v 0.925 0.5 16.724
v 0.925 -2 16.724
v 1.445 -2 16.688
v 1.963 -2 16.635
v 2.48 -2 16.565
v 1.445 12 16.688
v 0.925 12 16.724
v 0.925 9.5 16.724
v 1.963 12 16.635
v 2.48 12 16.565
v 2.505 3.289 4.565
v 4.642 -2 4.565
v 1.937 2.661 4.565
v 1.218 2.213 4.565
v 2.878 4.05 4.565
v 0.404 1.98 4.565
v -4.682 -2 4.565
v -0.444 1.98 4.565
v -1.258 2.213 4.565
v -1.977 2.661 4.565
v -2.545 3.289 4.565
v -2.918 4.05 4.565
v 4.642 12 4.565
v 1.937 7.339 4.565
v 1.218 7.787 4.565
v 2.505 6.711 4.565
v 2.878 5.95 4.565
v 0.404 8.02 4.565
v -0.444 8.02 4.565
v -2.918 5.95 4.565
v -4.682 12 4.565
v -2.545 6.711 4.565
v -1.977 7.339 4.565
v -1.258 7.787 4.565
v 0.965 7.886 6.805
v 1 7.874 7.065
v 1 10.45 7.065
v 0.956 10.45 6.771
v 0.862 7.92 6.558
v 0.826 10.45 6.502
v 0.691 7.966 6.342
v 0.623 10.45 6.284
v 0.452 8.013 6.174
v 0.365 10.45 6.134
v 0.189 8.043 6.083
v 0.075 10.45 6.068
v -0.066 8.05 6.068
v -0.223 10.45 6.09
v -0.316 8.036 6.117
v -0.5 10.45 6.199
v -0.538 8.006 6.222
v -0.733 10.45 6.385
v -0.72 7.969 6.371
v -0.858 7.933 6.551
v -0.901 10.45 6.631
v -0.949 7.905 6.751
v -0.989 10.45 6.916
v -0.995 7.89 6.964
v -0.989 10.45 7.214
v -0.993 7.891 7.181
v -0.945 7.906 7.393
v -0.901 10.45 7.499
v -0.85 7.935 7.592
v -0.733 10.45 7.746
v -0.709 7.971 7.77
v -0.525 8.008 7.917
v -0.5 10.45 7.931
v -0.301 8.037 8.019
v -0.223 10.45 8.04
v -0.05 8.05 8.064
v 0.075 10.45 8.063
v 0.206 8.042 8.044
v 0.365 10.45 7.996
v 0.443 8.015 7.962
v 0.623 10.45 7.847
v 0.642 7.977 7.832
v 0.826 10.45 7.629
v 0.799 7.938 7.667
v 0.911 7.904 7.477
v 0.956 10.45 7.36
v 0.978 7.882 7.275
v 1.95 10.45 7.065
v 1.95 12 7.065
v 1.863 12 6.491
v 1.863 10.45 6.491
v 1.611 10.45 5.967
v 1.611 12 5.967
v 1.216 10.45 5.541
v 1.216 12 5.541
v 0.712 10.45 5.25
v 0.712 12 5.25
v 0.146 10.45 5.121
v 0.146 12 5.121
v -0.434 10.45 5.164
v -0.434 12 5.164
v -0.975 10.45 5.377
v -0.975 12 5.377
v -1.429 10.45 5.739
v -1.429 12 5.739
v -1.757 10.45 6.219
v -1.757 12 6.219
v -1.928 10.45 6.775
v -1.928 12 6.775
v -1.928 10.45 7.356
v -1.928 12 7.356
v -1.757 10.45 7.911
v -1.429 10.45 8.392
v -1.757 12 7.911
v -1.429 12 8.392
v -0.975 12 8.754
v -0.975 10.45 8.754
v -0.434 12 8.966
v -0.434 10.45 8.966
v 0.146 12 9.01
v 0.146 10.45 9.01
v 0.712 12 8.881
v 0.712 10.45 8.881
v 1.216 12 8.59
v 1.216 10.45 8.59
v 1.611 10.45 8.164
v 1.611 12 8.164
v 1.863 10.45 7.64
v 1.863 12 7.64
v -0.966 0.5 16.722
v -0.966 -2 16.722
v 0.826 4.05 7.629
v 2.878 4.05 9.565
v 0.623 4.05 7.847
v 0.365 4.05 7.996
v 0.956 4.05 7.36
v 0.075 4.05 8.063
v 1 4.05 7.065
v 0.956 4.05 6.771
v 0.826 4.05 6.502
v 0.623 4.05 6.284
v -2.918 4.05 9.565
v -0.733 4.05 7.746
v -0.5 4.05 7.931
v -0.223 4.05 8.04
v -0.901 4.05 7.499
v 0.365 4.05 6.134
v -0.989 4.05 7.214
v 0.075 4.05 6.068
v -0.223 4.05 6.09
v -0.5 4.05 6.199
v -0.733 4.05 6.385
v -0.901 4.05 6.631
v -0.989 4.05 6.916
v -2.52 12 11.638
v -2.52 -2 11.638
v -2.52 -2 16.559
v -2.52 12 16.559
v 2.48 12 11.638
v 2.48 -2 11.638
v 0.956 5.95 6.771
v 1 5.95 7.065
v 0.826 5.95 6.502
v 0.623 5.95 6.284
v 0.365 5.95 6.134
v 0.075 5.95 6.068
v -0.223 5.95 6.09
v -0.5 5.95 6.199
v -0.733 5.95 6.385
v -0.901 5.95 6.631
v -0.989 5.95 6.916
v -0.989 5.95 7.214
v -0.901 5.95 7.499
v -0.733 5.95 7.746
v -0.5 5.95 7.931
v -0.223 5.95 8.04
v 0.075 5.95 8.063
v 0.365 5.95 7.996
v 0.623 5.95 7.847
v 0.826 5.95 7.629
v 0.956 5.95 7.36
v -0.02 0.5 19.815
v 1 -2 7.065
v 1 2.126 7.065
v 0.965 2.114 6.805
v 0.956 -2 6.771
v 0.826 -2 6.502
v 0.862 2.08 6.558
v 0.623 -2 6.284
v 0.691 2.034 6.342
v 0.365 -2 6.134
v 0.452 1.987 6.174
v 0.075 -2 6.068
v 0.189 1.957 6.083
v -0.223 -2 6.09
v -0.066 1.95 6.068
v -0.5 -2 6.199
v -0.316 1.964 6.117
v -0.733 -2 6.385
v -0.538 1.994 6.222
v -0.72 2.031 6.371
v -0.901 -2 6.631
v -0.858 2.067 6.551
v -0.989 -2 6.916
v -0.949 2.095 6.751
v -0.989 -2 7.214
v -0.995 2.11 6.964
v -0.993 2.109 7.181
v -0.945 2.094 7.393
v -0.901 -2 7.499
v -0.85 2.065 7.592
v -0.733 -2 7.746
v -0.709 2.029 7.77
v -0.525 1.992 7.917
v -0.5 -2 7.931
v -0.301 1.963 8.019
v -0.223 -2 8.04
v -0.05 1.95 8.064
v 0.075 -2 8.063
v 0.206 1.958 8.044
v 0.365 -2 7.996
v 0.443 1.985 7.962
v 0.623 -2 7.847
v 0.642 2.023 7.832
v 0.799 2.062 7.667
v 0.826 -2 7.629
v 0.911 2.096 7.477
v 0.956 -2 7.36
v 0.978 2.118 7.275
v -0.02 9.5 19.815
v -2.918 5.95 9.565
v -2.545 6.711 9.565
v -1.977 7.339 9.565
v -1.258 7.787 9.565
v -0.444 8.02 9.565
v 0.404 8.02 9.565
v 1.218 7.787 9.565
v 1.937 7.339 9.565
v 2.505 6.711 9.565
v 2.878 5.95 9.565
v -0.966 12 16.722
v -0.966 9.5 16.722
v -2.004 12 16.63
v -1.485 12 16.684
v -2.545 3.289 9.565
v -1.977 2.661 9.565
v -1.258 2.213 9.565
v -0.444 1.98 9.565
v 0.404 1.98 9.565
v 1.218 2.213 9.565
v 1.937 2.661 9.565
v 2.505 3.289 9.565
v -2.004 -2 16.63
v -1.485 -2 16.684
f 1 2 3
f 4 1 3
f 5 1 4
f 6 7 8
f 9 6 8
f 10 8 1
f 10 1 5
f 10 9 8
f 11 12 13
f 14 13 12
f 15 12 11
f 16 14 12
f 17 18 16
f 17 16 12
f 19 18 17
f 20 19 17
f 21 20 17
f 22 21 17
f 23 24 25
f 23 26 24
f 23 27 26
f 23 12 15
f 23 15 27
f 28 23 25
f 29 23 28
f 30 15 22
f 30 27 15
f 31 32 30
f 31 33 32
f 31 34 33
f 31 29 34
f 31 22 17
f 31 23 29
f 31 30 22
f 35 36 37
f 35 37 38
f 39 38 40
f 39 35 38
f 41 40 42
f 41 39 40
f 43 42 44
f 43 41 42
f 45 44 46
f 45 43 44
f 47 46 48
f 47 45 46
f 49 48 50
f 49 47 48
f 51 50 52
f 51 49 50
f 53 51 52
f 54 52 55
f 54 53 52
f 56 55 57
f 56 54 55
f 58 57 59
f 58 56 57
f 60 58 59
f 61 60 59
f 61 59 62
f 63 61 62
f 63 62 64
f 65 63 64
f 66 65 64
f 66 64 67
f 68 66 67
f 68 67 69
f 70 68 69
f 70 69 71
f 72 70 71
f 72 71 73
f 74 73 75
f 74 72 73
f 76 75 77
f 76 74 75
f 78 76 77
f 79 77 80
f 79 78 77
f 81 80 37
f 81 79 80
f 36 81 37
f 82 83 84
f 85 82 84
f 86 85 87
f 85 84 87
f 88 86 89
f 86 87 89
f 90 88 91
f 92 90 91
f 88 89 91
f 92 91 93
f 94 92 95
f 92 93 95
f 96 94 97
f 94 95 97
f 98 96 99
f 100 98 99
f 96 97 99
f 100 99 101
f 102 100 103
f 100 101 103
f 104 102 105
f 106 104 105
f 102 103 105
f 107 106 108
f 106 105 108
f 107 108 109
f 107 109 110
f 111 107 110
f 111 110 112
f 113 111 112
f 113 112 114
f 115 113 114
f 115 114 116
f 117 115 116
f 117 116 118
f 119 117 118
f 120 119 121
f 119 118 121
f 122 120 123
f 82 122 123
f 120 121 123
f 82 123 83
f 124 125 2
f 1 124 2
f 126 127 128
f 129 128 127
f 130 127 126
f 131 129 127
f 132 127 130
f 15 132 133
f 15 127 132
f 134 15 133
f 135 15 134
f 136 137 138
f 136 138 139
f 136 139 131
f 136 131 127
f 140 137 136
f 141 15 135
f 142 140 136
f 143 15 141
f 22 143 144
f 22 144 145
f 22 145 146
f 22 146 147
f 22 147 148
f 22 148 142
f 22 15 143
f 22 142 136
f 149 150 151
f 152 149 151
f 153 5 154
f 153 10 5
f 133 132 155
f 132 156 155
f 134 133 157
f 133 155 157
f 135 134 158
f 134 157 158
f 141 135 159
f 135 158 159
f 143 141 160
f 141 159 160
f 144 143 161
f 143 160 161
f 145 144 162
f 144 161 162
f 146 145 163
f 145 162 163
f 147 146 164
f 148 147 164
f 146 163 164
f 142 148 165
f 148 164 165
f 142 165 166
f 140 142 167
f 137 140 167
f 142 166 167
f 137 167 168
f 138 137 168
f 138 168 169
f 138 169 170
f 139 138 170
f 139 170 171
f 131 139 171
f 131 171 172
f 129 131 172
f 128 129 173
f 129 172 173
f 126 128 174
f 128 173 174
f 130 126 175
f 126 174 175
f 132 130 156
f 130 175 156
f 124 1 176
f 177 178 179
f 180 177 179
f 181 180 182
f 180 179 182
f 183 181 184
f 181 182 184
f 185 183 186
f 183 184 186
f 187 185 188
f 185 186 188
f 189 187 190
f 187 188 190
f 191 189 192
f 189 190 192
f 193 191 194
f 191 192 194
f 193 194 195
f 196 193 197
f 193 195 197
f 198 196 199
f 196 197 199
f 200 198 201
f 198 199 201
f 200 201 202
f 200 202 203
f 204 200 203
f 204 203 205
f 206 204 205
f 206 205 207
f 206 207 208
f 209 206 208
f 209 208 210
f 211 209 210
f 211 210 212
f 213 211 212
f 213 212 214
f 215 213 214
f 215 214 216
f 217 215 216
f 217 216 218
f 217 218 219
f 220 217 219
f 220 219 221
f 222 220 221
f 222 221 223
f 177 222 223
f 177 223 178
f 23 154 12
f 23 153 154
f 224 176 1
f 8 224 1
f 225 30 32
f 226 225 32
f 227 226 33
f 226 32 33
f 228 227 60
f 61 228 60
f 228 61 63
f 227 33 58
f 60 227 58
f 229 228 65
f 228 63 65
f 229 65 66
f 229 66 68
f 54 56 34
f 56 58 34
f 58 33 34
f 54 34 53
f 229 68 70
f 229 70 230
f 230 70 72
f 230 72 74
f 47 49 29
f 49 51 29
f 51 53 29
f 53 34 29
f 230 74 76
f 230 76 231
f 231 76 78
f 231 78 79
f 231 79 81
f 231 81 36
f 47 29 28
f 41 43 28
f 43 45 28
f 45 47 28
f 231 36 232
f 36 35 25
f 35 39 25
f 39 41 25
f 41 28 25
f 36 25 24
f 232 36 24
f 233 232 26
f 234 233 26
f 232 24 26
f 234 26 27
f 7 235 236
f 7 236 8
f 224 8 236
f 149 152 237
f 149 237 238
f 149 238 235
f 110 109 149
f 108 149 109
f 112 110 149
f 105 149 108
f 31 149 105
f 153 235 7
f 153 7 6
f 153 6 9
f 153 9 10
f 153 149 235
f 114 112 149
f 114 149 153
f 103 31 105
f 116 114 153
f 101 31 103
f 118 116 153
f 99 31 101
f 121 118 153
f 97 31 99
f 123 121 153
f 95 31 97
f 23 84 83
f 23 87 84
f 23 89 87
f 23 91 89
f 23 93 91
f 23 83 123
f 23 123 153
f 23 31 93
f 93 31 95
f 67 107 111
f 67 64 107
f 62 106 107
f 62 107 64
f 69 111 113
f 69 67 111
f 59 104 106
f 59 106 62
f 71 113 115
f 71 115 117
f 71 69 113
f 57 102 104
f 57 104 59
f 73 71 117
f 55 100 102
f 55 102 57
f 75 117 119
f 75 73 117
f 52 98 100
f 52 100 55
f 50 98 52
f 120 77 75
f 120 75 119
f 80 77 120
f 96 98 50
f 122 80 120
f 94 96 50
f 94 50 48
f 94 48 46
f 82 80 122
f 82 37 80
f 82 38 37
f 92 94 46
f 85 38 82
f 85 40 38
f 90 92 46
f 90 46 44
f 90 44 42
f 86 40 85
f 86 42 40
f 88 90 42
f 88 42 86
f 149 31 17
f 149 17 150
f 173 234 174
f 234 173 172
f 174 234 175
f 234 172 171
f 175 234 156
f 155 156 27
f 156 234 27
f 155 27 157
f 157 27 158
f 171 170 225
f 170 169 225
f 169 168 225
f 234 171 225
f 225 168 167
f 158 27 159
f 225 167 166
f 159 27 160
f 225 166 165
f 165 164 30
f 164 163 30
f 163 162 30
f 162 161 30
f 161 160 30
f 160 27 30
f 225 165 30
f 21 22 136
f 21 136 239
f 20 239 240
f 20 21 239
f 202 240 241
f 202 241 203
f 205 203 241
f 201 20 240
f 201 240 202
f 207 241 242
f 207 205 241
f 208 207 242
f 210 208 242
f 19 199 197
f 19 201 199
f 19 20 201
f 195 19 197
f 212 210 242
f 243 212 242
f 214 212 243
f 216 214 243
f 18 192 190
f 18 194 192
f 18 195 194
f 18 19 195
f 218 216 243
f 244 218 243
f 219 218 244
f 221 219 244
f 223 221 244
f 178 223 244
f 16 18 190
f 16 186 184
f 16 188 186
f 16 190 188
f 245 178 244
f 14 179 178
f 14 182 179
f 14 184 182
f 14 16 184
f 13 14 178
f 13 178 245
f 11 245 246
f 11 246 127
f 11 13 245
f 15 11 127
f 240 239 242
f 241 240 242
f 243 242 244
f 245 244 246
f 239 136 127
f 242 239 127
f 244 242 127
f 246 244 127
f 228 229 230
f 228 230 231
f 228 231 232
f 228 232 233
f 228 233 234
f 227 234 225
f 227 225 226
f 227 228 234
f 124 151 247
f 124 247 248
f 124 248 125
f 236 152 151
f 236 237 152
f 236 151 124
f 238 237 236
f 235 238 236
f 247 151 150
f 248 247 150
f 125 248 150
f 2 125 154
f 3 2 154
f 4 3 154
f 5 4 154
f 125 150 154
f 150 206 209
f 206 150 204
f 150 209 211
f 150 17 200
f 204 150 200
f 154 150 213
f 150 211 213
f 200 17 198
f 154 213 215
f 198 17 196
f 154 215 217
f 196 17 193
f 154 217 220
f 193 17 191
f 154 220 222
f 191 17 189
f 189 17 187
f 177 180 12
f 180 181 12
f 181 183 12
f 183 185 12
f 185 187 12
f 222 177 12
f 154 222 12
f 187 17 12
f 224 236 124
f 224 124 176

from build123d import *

# Parameters (mm, degrees)
BOSS_EXTRUDE1_DEPTH      = 12
BOSS_EXTRUDE1_DEPTH_BACK = 2
CUT_EXTRUDE1_DEPTH       = 5
SKETCH5_R                = 1
CUT_EXTRUDE2_DEPTH       = 7.26
CUT_EXTRUDE2_DEPTH_BACK  = 8.74
SKETCH6_R                = 1.95
CUT_EXTRUDE3_DEPTH       = 1.55
CUT_EXTRUDE4_DEPTH       = 2.5


with BuildPart() as part:
    # Sketch1 → Boss-Extrude1 (new body, two sides)
    with BuildSketch(Plane(origin=(0, 0, 0), x_dir=(1, 0, 0), z_dir=(0, 1, 0))) as boss_extrude1_sk:
        with BuildLine():
            Line((4.642363604, -4.565370009), (-4.68242218, -4.565370009))
            Line((-4.68242218, -4.565370009), (-2.520029288, -11.638238463))
            Line((-2.520029288, -11.638238463), (-2.520029288, -16.559323376))
            ThreePointArc((-2.520029288, -16.559323376), (-1.744780523, -16.658855879), (-0.965732534, -16.722114069))
            Line((-0.965732534, -16.722114069), (-0.020029288, -19.815370009))
            Line((-0.020029288, -19.815370009), (0.924969464, -16.724418368))
            ThreePointArc((0.924969464, -16.724418368), (1.704326405, -16.663043233), (2.479970712, -16.565370009))
            Line((2.479970712, -16.565370009), (2.479970712, -11.638238463))
            Line((2.479970712, -11.638238463), (4.642363604, -4.565370009))
        make_face()
    extrude(amount=BOSS_EXTRUDE1_DEPTH)
    extrude(boss_extrude1_sk.sketch, amount=-BOSS_EXTRUDE1_DEPTH_BACK)

    # Sketch2 → Cut-Extrude1 (cut)
    with BuildSketch(Plane(origin=(0, 0, 4.565370009), x_dir=(-1, 0, 0), z_dir=(0, 0, -1))):
        with BuildLine():
            Line((-2.878246061, 5.95), (2.918304637, 5.95))
            ThreePointArc((2.918304637, 5.95), (0.020029288, 8.05), (-2.878246061, 5.95))
        make_face()
        with BuildLine():
            Line((-2.878246061, 4.05), (2.918304637, 4.05))
            ThreePointArc((2.918304637, 4.05), (0.020029288, 1.95), (-2.878246061, 4.05))
        make_face()
    extrude(amount=-CUT_EXTRUDE1_DEPTH, mode=Mode.SUBTRACT)

    # Sketch5 → Cut-Extrude2 (cut, two sides)
    with BuildSketch(Plane(origin=(0, 5.74, 0), x_dir=(1, 0, 0), z_dir=(0, 1, 0))) as cut_extrude2_sk:
        with Locations((0, -7.065370009)):
            Circle(SKETCH5_R)
    extrude(amount=CUT_EXTRUDE2_DEPTH, mode=Mode.SUBTRACT)
    extrude(cut_extrude2_sk.sketch, amount=-CUT_EXTRUDE2_DEPTH_BACK, mode=Mode.SUBTRACT)

    # Sketch6 → Cut-Extrude3 (cut)
    with BuildSketch(Plane(origin=(0, 12, 0), x_dir=(1, 0, 0), z_dir=(0, 1, 0))):
        with Locations((0, -7.065370009)):
            Circle(SKETCH6_R)
    extrude(amount=-CUT_EXTRUDE3_DEPTH, mode=Mode.SUBTRACT)

    # Sketch7 → Cut-Extrude4 (cut)
    with BuildSketch(Plane(origin=(0, 12, 0), x_dir=(1, 0, 0), z_dir=(0, 1, 0))):
        Polygon((0.924969464, -16.724418368), (-0.020029288, -19.815370009), (-0.965732534, -16.722114069), align=None)
    cut_extrude4 = extrude(amount=-CUT_EXTRUDE4_DEPTH, mode=Mode.SUBTRACT)

    # Mirror1: Cut-Extrude4 across plane
    add(cut_extrude4.mirror(Plane.ZX.offset(5)), mode=Mode.SUBTRACT)


solid = part.part
